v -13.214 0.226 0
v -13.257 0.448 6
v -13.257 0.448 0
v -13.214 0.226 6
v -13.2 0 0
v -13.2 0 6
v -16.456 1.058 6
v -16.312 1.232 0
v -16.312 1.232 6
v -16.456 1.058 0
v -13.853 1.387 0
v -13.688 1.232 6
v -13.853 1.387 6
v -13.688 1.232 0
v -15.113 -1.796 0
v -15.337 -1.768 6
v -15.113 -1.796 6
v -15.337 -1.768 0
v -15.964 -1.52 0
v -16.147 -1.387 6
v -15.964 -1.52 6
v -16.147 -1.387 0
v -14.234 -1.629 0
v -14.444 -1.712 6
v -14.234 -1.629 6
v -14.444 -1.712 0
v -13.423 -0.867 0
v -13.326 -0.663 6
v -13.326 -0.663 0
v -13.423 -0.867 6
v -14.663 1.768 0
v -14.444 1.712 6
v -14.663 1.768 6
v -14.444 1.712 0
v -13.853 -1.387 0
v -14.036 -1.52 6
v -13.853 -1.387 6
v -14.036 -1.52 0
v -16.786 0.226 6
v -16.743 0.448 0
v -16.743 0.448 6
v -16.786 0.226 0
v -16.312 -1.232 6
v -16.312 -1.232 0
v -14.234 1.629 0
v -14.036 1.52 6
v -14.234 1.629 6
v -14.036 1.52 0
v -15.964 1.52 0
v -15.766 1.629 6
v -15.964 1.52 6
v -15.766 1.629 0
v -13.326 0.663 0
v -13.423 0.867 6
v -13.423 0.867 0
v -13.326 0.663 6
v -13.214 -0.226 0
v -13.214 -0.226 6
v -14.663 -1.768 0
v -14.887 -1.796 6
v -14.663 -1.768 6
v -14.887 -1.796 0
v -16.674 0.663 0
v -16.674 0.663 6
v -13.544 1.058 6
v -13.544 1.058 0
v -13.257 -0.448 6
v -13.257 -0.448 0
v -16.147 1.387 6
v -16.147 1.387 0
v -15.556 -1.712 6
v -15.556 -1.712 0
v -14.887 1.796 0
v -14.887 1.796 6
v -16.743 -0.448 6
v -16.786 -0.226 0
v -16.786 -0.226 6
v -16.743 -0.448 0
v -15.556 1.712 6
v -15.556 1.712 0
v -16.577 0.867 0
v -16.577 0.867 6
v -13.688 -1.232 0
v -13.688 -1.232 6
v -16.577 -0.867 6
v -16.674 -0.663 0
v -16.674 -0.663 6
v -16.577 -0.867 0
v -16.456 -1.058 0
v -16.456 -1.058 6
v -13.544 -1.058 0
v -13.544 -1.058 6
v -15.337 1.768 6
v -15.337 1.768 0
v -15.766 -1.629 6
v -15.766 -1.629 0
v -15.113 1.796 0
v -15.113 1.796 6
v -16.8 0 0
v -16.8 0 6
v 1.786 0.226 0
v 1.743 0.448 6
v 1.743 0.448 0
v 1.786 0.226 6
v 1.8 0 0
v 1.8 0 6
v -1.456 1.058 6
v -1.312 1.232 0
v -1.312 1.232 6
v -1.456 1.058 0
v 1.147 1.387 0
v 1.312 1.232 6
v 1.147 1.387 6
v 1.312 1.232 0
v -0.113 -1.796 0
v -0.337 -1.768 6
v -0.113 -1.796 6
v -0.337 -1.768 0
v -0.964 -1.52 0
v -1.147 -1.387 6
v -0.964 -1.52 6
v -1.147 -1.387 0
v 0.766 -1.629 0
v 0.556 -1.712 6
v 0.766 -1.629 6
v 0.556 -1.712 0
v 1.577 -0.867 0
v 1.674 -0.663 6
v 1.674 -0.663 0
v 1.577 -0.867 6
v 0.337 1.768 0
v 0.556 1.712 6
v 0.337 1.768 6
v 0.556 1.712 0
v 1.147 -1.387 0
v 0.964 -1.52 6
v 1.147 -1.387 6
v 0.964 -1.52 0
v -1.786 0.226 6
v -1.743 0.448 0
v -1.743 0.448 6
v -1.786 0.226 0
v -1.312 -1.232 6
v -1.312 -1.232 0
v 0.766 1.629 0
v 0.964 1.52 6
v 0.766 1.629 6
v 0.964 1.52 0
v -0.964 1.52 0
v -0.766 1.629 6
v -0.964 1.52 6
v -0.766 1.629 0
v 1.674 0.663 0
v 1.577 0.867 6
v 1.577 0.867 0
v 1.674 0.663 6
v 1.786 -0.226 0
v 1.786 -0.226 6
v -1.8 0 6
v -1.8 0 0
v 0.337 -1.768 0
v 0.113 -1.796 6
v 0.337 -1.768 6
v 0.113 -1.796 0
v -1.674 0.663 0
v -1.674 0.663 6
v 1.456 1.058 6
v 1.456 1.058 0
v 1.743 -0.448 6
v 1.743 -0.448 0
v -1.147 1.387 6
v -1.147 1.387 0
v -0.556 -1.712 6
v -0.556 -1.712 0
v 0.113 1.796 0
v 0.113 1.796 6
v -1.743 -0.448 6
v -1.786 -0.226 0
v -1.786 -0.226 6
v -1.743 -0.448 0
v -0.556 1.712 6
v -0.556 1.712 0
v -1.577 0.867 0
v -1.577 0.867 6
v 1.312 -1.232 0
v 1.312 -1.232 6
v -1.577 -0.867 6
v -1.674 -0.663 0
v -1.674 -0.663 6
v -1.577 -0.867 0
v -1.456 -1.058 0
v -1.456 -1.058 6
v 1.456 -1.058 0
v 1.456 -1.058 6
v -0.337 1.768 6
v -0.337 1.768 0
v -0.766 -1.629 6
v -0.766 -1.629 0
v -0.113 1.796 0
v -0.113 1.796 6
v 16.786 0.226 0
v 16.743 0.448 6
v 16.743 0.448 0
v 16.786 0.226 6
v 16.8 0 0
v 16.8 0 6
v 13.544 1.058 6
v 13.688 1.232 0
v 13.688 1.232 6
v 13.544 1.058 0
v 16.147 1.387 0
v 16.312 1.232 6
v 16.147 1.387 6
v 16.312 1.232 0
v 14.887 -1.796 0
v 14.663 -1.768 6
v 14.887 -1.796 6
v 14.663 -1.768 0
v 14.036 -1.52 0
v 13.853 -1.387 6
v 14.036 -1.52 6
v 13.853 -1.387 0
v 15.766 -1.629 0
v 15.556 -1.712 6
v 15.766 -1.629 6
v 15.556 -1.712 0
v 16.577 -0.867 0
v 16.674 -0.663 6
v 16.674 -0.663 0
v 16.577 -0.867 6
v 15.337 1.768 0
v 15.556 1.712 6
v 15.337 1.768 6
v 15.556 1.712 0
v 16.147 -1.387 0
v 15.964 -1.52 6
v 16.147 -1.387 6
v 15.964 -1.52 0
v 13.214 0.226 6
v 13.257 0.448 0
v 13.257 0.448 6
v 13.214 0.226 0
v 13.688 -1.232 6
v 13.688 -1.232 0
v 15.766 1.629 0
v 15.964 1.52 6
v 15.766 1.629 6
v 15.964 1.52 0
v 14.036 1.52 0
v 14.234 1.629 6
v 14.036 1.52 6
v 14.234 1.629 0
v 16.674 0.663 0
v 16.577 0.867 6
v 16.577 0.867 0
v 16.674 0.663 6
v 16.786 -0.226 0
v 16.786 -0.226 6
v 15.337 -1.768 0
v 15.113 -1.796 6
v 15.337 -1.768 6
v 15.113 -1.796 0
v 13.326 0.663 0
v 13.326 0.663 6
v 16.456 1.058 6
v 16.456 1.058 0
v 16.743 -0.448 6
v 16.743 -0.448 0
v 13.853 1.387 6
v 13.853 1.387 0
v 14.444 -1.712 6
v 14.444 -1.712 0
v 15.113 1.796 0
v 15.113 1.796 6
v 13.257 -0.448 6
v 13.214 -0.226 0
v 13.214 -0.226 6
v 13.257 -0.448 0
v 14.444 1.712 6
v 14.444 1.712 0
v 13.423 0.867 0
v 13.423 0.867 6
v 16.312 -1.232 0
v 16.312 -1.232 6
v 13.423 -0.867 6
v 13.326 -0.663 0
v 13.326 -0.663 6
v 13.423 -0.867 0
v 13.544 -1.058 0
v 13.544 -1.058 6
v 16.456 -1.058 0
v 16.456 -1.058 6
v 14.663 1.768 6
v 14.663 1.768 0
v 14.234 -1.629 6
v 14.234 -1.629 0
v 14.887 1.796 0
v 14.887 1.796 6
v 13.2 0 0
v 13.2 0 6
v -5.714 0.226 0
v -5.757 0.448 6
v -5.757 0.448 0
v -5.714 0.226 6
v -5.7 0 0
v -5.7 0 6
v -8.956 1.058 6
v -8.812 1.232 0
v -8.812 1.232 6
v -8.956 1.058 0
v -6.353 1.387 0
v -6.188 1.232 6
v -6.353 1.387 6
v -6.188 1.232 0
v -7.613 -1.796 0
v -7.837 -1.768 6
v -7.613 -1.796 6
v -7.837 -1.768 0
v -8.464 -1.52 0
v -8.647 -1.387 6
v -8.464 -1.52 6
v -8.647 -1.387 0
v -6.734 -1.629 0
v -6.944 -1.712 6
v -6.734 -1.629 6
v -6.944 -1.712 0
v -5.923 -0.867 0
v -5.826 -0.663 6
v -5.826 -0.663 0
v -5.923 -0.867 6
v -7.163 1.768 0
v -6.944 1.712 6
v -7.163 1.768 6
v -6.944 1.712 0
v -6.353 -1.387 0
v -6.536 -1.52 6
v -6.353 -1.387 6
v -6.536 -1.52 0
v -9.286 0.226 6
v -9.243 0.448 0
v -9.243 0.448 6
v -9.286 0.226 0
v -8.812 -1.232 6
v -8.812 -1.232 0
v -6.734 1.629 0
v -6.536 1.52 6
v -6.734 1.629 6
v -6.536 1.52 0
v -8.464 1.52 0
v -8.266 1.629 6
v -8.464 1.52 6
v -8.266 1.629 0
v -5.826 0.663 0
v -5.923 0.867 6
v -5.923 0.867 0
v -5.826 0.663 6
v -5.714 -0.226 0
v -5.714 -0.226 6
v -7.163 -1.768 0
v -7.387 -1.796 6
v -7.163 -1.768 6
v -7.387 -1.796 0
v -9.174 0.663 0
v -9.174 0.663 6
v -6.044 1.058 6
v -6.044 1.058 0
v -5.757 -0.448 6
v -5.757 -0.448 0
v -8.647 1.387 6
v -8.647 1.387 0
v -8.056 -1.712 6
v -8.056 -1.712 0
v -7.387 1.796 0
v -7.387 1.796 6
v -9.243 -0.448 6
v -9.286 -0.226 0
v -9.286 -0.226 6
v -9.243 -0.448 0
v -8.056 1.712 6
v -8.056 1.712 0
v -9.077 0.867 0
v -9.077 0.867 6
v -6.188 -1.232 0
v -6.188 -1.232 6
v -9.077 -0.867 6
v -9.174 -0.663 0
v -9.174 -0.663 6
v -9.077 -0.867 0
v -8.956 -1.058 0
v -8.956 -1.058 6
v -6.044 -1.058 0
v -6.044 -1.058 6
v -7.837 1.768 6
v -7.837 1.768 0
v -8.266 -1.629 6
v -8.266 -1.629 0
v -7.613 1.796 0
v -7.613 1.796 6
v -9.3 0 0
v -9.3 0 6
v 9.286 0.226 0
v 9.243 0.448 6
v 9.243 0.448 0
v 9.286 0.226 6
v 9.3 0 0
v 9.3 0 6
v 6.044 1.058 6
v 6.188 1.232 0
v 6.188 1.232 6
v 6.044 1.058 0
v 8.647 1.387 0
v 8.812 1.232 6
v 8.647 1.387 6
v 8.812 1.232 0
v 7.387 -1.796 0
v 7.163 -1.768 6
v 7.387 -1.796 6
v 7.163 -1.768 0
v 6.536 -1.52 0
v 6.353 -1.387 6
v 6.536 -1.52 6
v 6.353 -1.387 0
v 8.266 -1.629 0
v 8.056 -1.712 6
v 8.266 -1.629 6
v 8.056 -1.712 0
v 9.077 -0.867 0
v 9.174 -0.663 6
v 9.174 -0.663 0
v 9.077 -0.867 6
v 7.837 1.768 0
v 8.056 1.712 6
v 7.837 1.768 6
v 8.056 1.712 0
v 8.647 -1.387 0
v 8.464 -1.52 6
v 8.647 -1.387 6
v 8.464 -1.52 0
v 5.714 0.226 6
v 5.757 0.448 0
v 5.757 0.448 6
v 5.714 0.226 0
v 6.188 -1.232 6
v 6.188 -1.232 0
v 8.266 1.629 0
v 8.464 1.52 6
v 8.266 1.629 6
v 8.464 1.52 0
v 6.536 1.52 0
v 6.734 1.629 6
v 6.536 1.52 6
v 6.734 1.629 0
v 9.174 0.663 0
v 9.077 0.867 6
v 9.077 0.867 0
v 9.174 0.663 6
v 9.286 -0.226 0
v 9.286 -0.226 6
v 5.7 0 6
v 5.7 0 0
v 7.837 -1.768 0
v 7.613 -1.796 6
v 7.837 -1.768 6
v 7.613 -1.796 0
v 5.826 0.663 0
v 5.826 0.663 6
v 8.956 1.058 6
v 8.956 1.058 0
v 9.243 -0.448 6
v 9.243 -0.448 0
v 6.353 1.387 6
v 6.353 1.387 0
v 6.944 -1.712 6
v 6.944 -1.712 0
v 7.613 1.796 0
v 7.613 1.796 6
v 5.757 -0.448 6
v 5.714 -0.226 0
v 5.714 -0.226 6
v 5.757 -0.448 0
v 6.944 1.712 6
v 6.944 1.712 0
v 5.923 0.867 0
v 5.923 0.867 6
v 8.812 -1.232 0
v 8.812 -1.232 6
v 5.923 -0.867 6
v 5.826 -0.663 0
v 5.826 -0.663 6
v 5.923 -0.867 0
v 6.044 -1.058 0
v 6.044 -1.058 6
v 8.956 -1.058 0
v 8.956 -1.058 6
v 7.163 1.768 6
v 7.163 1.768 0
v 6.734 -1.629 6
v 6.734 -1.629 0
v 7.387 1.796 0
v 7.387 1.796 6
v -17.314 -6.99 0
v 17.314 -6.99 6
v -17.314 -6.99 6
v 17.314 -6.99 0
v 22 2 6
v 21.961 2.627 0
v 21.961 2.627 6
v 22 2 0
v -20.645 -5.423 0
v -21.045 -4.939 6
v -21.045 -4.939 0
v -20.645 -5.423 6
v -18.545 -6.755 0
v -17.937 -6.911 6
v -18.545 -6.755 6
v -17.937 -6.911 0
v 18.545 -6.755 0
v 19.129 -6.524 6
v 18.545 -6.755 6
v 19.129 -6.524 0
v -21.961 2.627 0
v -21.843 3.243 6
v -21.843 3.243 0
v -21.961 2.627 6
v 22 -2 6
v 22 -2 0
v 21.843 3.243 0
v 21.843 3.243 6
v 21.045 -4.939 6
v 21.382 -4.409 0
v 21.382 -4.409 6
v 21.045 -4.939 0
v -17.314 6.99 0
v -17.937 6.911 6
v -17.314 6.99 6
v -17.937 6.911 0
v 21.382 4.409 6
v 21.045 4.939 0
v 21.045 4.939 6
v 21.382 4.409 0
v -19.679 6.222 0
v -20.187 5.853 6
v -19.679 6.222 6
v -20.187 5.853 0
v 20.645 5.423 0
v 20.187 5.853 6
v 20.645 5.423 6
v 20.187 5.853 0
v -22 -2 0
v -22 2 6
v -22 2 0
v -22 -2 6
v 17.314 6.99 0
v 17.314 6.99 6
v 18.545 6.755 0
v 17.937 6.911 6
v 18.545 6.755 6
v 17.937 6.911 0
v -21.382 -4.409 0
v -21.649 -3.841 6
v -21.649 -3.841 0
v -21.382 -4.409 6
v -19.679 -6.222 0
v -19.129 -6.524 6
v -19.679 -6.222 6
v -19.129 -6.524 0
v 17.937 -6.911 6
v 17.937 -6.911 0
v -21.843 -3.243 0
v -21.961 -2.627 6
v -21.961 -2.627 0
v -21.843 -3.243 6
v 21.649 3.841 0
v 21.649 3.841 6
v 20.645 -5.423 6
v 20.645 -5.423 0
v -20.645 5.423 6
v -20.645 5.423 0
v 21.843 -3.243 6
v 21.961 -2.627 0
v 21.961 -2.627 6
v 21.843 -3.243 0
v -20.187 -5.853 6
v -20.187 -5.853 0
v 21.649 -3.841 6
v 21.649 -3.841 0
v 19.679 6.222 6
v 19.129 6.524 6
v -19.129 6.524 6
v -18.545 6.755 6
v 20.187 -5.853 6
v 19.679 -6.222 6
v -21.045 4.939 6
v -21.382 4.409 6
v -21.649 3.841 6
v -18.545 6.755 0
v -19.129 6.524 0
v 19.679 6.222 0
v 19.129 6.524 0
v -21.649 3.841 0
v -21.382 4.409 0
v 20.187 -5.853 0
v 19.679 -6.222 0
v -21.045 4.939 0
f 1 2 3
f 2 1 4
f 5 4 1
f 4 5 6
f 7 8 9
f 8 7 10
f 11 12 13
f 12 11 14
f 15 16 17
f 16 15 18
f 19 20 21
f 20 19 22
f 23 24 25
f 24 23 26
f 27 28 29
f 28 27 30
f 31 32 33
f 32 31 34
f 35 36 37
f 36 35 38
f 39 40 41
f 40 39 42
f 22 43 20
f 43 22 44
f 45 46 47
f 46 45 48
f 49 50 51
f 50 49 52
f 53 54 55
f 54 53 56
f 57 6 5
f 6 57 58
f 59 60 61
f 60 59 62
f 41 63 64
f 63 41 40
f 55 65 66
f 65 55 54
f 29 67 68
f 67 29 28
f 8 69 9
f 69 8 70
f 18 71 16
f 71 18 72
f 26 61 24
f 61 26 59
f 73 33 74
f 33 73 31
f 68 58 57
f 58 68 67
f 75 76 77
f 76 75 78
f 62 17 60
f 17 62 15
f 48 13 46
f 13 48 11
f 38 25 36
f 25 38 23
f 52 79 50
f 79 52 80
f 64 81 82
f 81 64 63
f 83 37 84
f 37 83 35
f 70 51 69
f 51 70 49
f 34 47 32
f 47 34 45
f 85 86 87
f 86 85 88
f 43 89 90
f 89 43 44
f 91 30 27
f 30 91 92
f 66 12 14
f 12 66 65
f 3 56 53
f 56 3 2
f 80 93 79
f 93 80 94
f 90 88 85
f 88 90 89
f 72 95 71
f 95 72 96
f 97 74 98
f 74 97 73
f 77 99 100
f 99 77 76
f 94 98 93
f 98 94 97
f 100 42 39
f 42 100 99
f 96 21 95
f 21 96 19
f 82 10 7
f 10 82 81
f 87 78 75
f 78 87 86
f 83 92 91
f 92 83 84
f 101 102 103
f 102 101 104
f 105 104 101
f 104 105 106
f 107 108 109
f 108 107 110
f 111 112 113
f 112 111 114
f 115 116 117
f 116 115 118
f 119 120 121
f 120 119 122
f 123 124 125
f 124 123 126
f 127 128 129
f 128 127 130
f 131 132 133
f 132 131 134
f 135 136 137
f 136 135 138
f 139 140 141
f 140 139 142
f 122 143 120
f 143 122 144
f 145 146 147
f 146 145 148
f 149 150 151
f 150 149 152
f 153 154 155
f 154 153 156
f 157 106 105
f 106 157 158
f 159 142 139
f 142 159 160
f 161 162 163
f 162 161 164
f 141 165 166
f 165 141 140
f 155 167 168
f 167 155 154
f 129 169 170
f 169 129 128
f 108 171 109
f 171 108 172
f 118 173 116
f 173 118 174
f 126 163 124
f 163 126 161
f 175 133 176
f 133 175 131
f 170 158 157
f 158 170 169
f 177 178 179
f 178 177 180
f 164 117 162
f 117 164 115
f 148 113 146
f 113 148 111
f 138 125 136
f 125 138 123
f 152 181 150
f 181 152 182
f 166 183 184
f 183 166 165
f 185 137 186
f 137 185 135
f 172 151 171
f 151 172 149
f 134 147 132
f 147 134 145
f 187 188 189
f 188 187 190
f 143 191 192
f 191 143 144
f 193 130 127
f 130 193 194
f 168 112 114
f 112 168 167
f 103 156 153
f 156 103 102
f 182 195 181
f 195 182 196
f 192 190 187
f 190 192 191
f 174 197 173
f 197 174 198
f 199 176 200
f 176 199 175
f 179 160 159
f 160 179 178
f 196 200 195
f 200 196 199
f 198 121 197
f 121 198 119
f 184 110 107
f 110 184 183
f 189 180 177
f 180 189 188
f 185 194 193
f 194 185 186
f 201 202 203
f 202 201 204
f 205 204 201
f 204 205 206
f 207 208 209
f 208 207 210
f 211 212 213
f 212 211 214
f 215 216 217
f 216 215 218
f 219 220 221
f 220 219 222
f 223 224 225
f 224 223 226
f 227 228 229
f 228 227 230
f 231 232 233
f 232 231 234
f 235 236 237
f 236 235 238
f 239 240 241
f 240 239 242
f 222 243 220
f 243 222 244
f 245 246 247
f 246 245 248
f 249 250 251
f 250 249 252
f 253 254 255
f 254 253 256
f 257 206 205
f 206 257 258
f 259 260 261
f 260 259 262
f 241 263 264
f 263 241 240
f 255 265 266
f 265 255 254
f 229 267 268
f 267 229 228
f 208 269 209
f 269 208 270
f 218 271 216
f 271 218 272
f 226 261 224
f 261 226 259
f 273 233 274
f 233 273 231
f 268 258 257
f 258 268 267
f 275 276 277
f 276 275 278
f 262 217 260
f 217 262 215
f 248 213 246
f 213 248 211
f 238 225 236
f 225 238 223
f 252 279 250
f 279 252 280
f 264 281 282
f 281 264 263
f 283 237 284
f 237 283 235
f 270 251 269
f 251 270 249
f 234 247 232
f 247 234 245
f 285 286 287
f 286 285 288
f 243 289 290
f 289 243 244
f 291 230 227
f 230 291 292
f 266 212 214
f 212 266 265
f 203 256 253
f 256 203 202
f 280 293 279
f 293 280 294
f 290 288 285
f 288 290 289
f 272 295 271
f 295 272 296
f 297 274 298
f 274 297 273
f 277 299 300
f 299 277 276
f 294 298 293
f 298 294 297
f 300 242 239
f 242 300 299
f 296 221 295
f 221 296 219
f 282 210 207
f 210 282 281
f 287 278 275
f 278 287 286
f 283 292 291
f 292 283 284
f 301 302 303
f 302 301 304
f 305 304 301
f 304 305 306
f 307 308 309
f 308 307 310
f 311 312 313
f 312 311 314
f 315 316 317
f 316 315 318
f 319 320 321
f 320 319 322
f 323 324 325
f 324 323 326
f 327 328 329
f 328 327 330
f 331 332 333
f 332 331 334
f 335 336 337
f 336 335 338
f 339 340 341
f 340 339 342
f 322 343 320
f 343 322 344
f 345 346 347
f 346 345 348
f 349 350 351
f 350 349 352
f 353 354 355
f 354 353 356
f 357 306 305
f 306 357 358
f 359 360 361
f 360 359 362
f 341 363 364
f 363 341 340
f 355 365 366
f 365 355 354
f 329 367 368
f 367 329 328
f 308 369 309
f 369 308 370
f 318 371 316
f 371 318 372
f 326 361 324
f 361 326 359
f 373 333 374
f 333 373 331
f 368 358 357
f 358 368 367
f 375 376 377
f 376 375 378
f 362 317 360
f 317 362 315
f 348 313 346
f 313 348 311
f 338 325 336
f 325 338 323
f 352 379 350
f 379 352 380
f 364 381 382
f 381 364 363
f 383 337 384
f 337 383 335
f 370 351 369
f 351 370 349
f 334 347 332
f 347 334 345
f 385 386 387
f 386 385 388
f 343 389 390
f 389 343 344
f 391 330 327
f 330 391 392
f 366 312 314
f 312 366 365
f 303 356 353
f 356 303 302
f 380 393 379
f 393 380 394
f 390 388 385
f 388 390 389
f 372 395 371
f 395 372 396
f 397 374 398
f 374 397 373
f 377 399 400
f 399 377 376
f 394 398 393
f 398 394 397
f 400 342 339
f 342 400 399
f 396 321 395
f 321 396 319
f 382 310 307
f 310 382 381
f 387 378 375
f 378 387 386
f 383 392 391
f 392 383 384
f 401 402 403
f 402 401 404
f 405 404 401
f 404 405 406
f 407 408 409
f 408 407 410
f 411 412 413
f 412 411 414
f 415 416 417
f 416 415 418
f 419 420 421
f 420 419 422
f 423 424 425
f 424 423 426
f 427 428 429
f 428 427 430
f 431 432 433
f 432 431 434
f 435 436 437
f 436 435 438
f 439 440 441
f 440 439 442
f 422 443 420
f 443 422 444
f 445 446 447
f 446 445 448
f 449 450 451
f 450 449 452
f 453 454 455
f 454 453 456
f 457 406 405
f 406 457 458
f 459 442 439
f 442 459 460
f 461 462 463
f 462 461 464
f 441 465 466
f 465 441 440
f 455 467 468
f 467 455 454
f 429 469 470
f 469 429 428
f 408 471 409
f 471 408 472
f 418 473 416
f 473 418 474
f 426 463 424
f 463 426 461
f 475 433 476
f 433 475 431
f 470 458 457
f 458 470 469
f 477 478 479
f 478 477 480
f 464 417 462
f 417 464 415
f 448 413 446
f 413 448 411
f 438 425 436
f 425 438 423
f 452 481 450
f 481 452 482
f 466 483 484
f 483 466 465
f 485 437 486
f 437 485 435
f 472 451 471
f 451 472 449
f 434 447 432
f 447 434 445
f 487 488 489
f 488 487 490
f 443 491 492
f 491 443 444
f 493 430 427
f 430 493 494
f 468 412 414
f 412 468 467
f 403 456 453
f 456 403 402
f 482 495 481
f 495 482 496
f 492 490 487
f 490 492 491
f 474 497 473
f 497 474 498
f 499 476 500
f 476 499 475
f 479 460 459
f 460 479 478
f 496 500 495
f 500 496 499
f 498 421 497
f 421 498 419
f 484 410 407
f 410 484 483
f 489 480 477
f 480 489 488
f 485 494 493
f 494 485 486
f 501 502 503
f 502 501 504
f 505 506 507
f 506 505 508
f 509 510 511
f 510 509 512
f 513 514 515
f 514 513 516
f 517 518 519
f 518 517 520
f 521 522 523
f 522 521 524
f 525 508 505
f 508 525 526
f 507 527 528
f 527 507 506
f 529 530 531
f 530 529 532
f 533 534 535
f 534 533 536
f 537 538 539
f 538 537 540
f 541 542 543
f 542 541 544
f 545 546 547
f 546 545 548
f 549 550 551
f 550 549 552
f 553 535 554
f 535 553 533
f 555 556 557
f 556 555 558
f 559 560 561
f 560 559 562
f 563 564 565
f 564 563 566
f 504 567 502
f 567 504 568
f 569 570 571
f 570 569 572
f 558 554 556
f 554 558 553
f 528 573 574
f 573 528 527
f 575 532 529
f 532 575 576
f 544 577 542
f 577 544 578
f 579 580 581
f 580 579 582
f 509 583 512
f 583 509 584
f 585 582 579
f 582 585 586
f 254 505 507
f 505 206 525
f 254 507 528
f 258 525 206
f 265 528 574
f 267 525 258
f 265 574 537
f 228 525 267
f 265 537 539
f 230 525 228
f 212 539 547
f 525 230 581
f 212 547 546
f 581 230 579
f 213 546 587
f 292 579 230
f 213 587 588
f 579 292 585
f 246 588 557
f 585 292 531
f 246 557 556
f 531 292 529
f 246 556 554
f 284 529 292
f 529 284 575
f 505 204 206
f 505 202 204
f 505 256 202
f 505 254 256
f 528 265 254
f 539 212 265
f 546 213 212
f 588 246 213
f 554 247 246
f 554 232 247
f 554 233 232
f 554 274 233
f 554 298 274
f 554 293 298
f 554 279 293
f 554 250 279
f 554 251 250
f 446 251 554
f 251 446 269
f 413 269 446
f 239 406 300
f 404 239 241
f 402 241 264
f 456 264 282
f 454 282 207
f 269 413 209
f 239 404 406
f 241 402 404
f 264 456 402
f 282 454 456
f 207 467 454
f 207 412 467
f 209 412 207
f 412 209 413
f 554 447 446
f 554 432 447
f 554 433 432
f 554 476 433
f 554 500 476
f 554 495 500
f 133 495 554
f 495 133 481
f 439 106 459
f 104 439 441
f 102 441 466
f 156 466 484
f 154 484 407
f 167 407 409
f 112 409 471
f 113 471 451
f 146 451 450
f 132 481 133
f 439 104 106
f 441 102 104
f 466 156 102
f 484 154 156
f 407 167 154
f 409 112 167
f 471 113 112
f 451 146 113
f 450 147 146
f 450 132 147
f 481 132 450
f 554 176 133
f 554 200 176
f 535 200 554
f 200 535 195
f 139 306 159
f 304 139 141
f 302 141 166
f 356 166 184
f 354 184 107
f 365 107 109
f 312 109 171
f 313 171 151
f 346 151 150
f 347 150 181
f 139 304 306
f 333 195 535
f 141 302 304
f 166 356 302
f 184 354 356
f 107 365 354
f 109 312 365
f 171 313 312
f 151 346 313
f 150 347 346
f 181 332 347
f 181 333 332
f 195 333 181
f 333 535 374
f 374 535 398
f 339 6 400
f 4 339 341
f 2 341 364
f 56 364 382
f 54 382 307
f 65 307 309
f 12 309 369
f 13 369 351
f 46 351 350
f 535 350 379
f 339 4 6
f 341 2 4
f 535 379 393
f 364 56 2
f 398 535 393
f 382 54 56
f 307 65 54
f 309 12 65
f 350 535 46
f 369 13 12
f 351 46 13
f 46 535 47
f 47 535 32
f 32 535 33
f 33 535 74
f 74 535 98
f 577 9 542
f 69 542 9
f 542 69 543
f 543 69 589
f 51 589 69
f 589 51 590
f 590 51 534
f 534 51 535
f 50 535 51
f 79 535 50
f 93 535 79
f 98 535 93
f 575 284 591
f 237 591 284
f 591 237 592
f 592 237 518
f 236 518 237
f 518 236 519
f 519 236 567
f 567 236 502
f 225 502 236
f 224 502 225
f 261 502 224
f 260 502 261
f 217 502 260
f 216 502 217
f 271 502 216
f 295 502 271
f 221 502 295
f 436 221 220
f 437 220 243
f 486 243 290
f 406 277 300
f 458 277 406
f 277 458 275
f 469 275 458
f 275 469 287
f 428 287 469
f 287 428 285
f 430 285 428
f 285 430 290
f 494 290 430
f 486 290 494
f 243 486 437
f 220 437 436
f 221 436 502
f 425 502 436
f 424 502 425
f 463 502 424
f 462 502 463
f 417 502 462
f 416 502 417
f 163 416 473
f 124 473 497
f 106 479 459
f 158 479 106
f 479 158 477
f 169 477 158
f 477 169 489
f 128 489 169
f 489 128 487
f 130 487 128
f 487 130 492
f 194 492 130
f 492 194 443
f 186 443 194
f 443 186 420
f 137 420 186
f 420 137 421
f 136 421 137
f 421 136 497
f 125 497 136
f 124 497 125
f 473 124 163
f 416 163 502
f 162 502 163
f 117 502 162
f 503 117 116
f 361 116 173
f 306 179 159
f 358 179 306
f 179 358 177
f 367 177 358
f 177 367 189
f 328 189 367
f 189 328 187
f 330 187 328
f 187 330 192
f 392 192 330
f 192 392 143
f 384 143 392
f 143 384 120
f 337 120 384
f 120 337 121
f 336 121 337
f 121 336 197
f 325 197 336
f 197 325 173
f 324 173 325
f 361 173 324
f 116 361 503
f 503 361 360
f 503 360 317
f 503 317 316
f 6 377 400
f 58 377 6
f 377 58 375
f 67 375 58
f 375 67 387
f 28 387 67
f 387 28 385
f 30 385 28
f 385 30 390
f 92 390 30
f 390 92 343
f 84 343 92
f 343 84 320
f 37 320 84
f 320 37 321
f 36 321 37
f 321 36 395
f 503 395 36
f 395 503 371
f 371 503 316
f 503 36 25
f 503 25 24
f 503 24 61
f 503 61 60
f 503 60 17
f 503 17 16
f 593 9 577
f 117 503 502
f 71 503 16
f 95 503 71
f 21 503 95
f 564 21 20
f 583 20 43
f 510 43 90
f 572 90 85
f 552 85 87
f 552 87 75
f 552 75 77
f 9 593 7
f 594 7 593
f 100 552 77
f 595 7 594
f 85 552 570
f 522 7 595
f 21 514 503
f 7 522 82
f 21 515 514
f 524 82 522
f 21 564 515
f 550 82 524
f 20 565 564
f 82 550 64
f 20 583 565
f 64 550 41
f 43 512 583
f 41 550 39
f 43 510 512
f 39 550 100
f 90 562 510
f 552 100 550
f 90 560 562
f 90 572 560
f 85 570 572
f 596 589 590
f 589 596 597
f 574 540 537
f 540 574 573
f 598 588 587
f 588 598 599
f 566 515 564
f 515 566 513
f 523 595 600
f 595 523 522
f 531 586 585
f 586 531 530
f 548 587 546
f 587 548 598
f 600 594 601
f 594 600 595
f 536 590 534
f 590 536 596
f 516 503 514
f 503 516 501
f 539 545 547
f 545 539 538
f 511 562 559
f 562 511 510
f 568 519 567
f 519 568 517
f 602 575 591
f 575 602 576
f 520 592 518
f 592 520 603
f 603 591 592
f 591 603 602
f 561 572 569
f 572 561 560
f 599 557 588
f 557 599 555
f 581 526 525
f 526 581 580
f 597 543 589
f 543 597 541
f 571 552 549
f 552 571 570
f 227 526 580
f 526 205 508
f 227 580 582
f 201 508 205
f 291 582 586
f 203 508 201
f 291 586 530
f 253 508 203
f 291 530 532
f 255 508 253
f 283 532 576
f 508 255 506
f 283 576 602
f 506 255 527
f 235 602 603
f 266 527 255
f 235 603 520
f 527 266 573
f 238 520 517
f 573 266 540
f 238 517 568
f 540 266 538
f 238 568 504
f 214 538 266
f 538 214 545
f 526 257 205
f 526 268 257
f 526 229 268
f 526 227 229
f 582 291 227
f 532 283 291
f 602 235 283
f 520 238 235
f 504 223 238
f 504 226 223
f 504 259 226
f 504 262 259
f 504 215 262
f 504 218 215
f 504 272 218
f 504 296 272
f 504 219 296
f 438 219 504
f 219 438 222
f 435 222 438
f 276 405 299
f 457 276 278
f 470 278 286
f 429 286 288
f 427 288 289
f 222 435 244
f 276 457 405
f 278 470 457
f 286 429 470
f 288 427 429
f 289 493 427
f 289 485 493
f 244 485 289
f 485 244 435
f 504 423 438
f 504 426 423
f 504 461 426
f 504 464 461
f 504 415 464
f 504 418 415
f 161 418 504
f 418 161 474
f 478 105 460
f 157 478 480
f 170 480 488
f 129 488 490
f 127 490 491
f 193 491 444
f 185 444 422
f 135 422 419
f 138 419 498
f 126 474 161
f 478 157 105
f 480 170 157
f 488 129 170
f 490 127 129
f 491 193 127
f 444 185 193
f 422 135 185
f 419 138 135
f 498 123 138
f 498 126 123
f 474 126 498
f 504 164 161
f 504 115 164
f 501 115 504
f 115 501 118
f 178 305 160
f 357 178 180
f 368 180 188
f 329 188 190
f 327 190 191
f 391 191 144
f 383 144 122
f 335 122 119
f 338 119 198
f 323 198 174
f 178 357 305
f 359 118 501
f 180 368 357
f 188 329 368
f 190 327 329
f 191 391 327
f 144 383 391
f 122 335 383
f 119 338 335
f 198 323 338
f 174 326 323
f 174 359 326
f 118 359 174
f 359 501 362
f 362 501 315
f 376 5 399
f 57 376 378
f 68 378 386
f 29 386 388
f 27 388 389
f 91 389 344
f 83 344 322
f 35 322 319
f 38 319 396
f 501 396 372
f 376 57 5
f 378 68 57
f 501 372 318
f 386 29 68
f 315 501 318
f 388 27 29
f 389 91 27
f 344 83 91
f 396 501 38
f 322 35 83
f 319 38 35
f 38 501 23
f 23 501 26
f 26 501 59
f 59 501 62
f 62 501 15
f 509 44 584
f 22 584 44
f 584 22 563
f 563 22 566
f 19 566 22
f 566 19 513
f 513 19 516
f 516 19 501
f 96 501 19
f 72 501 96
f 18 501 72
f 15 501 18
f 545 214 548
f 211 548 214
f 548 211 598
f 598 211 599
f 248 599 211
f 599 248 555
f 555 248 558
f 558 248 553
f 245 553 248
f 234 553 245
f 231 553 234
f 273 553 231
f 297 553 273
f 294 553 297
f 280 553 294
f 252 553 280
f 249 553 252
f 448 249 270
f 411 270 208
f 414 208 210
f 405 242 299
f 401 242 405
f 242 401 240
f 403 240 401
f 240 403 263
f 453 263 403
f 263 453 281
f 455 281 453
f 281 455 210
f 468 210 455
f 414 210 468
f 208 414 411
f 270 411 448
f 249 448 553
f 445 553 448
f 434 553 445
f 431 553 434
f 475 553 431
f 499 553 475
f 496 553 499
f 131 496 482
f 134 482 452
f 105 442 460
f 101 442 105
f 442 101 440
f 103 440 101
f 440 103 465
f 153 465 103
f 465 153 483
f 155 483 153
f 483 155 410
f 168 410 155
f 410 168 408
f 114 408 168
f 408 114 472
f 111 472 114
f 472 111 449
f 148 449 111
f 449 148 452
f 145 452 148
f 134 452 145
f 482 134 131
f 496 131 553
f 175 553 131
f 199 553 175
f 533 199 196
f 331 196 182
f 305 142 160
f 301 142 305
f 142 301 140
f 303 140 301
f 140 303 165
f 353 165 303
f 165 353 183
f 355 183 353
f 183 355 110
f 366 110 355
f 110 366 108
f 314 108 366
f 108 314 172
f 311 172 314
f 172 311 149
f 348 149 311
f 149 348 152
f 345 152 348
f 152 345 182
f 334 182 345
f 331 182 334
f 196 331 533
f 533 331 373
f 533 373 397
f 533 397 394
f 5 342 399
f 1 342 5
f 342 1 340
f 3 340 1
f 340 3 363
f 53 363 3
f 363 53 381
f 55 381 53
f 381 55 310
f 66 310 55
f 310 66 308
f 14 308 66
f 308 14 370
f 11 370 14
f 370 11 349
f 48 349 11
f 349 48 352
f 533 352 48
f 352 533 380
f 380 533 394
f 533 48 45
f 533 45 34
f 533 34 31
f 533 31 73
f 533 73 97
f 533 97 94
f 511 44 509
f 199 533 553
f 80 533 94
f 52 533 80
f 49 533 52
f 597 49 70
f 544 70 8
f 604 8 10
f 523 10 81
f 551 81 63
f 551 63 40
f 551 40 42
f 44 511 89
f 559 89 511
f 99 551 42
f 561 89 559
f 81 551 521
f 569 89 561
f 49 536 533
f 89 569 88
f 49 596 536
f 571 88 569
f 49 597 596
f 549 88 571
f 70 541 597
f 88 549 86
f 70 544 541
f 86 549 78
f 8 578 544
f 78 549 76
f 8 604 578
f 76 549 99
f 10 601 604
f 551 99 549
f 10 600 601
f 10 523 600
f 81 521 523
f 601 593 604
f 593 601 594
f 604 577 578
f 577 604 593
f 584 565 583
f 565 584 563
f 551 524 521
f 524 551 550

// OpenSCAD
$fn = 50;


difference() {
	union() {
		hull() {
			translate(v = [-17.0000000000, 2.0000000000, 0]) {
				cylinder(h = 6, r = 5);
			}
			translate(v = [17.0000000000, 2.0000000000, 0]) {
				cylinder(h = 6, r = 5);
			}
			translate(v = [-17.0000000000, -2.0000000000, 0]) {
				cylinder(h = 6, r = 5);
			}
			translate(v = [17.0000000000, -2.0000000000, 0]) {
				cylinder(h = 6, r = 5);
			}
		}
	}
	union() {
		translate(v = [-15.0000000000, 0.0000000000, 0]) {
			translate(v = [0, 0, -100]) {
				cylinder(h = 200, r = 1.8000000000);
			}
		}
		translate(v = [0, 0, -100]) {
			cylinder(h = 200, r = 1.8000000000);
		}
		translate(v = [15.0000000000, 0.0000000000, 0]) {
			translate(v = [0, 0, -100]) {
				cylinder(h = 200, r = 1.8000000000);
			}
		}
		translate(v = [-15.0000000000, 0.0000000000, 0]) {
			translate(v = [0, 0, -100]) {
				cylinder(h = 200, r = 1.8000000000);
			}
		}
		translate(v = [-7.5000000000, 0.0000000000, 0]) {
			translate(v = [0, 0, -100]) {
				cylinder(h = 200, r = 1.8000000000);
			}
		}
		translate(v = [0, 0, -100]) {
			cylinder(h = 200, r = 1.8000000000);
		}
		translate(v = [7.5000000000, 0.0000000000, 0]) {
			translate(v = [0, 0, -100]) {
				cylinder(h = 200, r = 1.8000000000);
			}
		}
		translate(v = [15.0000000000, 0.0000000000, 0]) {
			translate(v = [0, 0, -100]) {
				cylinder(h = 200, r = 1.8000000000);
			}
		}
	}
}
